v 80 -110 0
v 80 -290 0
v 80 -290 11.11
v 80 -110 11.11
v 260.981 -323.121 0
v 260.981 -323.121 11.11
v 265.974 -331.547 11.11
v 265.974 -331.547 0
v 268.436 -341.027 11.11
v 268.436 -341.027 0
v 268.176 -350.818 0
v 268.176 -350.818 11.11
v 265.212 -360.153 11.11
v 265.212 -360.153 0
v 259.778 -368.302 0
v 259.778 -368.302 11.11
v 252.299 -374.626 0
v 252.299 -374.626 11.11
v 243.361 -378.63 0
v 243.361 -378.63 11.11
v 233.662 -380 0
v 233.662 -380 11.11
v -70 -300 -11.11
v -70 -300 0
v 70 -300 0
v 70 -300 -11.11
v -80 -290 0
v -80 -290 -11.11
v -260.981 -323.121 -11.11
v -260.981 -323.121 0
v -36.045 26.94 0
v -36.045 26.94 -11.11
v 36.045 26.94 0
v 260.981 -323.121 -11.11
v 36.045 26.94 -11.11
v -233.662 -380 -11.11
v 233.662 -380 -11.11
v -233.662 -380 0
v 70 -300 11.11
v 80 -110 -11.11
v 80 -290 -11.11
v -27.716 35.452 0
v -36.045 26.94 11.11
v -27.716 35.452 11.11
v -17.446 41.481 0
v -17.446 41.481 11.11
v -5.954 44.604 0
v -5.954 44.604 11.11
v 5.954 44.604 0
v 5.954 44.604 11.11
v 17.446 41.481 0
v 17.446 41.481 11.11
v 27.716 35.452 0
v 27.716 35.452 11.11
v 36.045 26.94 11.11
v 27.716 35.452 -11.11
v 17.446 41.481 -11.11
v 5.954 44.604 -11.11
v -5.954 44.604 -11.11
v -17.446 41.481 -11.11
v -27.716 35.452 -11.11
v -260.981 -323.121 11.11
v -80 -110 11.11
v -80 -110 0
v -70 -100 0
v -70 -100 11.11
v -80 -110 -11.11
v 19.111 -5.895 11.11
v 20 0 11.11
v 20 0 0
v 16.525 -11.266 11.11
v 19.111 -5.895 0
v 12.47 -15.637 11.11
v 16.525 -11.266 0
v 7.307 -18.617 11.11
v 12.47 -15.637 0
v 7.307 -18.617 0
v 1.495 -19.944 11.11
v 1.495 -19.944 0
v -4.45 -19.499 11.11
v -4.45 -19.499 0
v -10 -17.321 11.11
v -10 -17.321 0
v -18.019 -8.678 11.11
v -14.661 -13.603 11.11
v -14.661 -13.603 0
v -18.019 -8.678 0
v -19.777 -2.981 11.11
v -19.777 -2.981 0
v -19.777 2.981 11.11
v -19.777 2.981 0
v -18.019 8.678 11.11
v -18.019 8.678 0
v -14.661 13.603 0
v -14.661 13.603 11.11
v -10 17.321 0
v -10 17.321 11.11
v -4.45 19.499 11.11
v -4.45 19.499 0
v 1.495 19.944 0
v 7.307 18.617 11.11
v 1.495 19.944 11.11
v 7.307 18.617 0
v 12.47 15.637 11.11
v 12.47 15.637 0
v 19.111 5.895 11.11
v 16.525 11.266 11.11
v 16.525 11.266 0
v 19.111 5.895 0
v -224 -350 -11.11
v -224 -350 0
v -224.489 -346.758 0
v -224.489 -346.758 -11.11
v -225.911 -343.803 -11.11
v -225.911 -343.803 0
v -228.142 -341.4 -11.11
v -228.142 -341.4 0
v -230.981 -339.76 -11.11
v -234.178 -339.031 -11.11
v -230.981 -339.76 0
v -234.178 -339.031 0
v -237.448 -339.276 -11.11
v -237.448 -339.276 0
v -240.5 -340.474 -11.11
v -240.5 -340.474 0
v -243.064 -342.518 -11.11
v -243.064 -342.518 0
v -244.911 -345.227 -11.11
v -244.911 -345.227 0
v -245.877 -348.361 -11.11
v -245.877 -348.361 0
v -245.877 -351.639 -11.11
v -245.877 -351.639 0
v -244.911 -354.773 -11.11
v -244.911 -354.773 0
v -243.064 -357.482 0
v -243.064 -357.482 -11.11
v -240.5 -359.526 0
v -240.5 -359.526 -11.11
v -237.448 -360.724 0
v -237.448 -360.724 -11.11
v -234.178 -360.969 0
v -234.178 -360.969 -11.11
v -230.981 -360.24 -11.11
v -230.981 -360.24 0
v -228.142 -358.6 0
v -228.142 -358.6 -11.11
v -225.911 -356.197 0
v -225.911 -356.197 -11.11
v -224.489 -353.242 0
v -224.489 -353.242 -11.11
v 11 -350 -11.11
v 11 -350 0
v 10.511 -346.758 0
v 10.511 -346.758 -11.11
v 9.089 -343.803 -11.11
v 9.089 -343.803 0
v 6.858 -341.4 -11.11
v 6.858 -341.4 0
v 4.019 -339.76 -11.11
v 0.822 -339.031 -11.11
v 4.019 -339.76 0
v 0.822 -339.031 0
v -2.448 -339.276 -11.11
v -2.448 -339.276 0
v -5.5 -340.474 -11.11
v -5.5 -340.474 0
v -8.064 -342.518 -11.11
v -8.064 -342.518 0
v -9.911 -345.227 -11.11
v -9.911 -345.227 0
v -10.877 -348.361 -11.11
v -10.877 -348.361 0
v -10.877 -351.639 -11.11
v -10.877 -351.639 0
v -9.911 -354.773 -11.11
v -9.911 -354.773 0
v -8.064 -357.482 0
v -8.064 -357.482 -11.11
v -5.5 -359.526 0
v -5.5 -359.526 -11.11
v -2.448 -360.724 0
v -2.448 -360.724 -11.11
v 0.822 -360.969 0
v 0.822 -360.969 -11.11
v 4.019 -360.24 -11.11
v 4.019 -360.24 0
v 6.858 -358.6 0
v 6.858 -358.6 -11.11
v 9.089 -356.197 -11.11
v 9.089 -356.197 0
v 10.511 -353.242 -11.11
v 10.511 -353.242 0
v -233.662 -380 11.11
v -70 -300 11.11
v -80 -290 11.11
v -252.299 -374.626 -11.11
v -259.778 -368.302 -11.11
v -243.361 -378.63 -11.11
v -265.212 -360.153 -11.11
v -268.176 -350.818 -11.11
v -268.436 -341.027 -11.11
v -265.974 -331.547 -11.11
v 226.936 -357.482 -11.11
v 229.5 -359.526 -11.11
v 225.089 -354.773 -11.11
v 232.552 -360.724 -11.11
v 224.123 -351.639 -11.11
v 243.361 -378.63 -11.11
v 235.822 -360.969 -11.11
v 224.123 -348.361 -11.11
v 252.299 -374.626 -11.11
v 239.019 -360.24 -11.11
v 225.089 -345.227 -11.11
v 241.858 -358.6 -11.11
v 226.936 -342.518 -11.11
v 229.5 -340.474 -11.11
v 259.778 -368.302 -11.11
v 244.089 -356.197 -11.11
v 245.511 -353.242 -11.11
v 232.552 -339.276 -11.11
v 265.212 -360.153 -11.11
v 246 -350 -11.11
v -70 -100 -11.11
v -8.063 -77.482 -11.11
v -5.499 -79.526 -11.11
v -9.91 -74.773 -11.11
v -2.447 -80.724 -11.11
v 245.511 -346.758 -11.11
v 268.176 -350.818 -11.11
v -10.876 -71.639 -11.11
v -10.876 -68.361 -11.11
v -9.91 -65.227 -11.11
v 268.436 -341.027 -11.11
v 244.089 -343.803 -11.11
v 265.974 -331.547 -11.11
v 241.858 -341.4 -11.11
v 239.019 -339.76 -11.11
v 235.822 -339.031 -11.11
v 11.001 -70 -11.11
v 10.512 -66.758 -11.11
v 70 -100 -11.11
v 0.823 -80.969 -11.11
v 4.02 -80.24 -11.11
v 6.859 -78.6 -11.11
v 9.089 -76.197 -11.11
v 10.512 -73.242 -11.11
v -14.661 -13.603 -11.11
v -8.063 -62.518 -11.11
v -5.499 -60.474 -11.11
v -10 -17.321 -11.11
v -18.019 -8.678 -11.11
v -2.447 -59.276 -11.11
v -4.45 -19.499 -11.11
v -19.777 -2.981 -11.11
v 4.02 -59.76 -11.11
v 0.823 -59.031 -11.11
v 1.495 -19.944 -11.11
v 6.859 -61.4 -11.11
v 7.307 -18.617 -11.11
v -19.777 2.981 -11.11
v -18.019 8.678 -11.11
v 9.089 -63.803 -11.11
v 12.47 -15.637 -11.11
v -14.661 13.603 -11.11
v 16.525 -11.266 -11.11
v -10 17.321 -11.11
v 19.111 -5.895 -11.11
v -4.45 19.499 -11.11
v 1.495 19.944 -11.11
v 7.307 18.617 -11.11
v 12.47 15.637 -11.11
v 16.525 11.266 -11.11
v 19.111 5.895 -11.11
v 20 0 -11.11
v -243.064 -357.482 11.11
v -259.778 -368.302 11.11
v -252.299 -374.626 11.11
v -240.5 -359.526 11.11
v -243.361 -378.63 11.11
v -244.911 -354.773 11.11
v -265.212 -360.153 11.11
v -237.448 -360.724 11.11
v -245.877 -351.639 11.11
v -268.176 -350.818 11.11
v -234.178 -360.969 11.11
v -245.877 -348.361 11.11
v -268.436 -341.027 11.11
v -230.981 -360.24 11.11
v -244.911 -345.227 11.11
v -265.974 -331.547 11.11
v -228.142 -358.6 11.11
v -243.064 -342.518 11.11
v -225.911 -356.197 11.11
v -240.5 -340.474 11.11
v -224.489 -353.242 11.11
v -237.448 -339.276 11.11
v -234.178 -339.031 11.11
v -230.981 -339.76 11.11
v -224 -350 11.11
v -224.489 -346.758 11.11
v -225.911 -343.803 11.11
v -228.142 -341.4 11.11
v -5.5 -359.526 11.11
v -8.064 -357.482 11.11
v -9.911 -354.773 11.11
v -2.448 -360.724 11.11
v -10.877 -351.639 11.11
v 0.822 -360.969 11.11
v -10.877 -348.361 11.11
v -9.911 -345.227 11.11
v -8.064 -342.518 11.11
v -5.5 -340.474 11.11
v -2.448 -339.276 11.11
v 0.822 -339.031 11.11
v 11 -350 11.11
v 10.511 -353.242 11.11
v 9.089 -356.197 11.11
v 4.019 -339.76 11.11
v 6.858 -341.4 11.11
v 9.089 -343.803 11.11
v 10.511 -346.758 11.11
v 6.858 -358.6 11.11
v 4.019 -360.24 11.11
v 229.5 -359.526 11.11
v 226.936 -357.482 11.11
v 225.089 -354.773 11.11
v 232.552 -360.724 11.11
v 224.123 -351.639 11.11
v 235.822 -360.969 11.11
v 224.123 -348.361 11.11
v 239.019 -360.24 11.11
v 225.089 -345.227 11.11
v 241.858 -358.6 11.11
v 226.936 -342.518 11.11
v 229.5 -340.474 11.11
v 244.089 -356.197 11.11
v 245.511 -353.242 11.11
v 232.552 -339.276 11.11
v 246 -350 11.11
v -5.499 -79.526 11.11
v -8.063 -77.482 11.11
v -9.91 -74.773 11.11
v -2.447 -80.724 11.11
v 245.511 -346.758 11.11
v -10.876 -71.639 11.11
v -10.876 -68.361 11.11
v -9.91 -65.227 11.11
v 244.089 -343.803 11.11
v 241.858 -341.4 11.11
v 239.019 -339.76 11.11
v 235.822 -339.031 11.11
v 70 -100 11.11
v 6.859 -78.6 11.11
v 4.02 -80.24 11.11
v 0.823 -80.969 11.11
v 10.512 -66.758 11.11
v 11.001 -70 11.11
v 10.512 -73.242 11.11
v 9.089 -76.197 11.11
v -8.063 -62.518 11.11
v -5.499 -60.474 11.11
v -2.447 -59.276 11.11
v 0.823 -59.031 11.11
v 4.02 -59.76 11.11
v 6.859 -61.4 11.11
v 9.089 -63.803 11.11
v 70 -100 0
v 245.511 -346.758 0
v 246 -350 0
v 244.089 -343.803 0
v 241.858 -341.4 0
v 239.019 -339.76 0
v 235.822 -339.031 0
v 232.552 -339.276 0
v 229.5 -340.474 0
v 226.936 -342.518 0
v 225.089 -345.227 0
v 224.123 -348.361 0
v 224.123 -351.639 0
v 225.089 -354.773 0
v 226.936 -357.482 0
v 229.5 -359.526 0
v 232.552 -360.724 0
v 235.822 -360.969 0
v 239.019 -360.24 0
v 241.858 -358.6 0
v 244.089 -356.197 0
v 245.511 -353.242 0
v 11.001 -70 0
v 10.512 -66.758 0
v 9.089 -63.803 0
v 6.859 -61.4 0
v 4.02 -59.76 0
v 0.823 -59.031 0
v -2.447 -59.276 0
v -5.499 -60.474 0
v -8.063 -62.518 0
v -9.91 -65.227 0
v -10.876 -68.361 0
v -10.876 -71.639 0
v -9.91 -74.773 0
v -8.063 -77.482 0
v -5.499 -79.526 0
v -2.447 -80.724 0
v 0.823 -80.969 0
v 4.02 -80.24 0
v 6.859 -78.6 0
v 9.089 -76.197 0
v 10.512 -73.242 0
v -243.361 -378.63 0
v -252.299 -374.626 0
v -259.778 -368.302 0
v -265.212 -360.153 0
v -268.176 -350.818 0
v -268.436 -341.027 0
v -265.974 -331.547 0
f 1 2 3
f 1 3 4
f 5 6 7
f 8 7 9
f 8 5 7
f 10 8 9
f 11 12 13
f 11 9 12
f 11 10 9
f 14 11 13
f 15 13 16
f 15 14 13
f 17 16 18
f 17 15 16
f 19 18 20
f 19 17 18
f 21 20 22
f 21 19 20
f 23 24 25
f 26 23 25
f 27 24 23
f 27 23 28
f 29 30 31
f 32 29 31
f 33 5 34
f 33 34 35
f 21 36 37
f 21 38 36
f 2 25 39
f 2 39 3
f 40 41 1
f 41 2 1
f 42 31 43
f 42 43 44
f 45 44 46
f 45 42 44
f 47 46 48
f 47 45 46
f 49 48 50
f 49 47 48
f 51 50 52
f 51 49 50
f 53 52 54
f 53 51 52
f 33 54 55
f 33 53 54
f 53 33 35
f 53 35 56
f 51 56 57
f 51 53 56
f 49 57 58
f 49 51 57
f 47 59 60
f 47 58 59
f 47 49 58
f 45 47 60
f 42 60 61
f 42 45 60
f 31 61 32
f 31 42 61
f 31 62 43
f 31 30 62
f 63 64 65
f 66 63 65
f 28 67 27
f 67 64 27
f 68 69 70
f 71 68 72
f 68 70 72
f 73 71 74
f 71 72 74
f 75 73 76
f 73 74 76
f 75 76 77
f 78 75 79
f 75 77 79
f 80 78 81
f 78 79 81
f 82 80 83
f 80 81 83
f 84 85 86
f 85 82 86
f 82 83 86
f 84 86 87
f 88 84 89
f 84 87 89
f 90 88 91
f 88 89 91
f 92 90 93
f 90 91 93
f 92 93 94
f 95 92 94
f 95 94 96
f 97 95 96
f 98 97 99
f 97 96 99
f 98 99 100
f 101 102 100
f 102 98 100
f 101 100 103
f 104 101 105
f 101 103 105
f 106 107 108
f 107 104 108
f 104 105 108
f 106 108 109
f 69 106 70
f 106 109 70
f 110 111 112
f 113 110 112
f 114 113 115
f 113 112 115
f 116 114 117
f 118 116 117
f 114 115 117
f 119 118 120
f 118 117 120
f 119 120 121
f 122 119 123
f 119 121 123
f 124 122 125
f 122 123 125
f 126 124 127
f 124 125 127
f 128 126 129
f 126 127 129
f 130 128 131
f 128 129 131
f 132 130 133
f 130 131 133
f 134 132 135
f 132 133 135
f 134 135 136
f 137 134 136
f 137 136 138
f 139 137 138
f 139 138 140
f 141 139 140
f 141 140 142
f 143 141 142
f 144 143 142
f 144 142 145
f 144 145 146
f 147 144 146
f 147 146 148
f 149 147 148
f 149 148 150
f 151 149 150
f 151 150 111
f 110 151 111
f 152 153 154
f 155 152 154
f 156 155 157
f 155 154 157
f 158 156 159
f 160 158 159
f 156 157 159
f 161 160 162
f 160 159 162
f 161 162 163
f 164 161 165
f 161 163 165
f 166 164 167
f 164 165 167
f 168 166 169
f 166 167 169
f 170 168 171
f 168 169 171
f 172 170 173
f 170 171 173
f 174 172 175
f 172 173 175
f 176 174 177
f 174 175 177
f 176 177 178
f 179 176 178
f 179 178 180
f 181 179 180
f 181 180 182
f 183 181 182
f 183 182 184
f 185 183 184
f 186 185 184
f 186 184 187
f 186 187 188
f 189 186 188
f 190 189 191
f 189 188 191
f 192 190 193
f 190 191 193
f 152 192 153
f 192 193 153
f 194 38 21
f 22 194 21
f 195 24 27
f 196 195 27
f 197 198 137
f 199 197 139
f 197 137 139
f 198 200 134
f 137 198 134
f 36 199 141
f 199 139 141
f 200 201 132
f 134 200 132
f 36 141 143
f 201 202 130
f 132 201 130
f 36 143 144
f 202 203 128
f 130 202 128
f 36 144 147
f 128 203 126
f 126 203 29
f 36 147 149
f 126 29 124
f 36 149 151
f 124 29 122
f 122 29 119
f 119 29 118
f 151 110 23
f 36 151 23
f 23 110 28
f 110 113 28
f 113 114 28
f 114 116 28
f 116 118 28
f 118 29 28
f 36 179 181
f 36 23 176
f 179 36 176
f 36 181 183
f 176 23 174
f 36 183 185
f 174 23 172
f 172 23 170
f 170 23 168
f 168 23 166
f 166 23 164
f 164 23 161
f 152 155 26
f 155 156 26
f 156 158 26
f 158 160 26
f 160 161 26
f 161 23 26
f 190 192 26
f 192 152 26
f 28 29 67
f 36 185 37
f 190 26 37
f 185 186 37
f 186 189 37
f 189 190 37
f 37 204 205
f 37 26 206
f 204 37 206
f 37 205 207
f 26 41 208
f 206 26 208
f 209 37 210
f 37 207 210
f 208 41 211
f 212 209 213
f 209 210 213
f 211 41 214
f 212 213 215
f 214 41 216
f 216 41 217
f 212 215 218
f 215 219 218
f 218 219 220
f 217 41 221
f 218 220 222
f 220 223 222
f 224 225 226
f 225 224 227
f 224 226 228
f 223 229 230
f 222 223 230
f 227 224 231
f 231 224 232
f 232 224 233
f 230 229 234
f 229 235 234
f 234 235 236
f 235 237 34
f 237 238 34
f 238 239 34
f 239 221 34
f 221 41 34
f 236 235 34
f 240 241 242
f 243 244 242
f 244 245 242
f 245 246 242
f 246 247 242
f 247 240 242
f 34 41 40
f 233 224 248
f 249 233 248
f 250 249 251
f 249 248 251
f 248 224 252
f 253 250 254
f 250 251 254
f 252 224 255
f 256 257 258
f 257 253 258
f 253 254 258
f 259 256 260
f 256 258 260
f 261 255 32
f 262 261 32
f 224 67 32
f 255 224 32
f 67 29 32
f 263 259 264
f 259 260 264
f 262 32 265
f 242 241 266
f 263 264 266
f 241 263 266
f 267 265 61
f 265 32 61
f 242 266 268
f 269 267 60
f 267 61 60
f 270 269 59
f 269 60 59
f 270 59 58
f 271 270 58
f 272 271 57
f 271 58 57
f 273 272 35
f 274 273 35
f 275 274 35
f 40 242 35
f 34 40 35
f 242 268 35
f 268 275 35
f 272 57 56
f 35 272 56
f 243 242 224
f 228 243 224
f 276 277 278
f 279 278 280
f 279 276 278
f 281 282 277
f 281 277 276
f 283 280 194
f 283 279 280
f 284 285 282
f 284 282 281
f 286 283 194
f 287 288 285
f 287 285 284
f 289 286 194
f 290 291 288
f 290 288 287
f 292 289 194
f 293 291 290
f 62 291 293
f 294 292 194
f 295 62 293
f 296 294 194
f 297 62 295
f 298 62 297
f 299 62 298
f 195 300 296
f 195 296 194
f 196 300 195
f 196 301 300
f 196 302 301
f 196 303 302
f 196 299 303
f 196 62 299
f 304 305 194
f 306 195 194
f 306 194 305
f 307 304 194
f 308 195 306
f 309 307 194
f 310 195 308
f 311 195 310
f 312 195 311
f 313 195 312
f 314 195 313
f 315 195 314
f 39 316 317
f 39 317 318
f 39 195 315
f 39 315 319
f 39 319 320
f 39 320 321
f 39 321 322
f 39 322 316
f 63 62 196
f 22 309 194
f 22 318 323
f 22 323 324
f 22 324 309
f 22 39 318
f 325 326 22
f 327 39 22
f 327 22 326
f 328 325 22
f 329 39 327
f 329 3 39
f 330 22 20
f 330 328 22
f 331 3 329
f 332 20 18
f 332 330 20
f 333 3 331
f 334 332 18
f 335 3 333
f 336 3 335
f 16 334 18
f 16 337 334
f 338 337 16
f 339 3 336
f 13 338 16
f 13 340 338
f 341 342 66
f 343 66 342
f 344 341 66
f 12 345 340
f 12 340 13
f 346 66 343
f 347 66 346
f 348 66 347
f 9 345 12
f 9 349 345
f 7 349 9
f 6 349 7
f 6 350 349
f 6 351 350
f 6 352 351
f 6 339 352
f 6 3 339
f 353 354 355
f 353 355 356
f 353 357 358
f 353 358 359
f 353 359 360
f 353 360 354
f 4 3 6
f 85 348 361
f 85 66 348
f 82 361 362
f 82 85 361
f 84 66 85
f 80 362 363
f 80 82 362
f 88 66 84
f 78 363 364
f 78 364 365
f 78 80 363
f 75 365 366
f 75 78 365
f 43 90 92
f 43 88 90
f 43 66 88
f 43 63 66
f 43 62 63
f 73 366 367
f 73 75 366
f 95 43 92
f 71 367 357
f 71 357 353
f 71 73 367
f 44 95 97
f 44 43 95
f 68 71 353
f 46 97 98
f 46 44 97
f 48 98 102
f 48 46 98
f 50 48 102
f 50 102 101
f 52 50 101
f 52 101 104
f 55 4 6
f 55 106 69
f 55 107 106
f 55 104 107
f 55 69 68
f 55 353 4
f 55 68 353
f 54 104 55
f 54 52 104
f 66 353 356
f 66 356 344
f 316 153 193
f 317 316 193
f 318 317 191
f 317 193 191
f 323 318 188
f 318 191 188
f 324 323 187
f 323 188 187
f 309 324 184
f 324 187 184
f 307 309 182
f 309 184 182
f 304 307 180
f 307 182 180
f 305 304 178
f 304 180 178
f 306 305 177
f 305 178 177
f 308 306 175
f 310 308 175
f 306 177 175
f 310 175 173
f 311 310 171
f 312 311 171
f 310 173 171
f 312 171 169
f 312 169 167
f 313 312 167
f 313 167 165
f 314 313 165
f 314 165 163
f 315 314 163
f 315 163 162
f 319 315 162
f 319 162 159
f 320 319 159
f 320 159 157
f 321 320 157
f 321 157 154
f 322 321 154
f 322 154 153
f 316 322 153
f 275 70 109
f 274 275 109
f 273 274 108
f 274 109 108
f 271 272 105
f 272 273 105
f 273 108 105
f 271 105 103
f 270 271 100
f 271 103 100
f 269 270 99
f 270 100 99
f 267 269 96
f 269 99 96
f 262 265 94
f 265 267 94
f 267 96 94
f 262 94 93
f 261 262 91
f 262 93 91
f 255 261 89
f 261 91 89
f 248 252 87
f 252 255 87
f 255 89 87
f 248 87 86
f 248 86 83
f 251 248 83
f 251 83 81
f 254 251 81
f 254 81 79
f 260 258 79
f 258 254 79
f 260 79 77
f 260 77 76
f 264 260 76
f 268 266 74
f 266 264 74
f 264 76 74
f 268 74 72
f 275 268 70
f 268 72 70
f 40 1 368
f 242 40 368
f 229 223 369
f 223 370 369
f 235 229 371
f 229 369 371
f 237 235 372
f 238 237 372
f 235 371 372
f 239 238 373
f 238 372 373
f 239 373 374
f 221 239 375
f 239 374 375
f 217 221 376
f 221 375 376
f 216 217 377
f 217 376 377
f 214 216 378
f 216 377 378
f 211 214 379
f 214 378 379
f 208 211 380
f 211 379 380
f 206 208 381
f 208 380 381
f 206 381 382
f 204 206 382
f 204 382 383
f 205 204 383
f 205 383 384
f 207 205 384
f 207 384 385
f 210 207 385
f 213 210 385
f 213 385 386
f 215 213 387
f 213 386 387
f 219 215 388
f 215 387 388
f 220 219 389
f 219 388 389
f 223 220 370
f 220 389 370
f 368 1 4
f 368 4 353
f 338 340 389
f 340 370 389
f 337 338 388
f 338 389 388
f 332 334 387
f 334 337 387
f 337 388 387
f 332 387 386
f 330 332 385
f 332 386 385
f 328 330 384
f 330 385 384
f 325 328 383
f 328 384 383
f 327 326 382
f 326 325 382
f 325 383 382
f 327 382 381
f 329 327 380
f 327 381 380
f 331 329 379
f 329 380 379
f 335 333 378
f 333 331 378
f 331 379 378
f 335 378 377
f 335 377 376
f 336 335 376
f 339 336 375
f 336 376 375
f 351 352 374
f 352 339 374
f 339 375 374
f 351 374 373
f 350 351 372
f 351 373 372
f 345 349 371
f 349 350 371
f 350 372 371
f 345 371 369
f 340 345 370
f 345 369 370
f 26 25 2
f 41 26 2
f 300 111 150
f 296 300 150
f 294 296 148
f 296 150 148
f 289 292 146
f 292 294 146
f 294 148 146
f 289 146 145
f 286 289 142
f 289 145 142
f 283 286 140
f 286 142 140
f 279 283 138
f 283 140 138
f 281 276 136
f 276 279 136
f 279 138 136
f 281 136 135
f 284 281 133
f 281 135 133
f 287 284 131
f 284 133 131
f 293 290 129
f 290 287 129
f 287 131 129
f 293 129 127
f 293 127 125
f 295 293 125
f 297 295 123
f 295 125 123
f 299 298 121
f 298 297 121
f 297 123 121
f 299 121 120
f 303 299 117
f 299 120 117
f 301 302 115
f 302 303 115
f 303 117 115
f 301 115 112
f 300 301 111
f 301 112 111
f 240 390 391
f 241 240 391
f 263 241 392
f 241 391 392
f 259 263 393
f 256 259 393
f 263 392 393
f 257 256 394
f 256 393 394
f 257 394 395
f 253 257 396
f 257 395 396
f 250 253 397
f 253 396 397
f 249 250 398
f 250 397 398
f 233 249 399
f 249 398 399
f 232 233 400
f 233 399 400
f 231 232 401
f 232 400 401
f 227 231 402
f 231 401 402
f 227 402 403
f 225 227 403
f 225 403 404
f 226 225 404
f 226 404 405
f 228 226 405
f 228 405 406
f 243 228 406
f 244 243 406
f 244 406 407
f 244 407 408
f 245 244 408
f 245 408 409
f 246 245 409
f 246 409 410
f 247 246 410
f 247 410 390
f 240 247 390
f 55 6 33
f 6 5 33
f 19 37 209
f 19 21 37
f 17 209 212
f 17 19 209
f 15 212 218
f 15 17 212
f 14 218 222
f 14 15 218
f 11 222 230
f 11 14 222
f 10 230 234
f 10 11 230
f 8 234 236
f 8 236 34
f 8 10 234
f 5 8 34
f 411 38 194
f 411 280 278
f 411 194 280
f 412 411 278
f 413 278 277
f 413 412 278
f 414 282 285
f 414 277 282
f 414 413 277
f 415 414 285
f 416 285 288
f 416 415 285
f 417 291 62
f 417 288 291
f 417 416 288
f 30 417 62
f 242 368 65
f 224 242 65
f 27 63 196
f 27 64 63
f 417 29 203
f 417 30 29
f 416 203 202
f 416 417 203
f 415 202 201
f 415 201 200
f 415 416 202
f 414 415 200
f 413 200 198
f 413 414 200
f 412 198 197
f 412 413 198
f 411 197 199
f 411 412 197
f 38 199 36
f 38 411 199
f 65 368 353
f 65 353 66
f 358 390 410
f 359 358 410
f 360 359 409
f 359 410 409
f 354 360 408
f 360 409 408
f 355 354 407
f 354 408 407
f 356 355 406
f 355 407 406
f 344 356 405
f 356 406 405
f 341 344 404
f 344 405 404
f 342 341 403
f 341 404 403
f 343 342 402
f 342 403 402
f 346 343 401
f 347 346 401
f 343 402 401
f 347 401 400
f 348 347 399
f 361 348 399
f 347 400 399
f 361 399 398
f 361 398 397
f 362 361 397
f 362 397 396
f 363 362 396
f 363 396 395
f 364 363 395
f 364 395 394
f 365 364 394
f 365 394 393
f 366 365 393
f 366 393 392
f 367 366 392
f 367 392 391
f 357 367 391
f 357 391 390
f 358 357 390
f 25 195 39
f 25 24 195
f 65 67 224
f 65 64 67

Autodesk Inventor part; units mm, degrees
ref_plane "YZ Plane" through (0, 0, 0) normal (1, 0, 0) x (0, 1, 0)
ref_plane "XZ Plane" through (0, 0, 0) normal (0, 1, 0) x (-1, 0, 0)
ref_plane "XY Plane" through (0, 0, 0) normal (0, 0, 1) x (1, 0, 0)
sketch "Sketch1" plane through (0, 0, 0) normal (0, 0, 1) x (1, 0, 0)
  circle A0 centre (0, 0) radius 20
  circle A1 centre (0, -350) radius 11
  circle A2 centre (-235, -350) radius 11
  circle A3 centre (235, -350) radius 11
  line L0 (-233.6625, -380) -> (233.6625, -380)
  arc A4 (233.6625, -380) -> (260.9808, -323.1206) centre (233.6625, -345) ccw
  circle A5 centre (0.0008, -70) radius 11
  line L1 (70, -100) -> (-70, -100)
  line L2 (-80, -110) -> (-80, -290)
  line L3 (-70, -300) -> (70, -300)
  line L4 (80, -290) -> (80, -110)
  line L5 (80, -100) -> (-80, -300) construction
  line L6 (-80, -100) -> (80, -300) construction
  line L7 (0, 64.9697) -> (0, -492.5476)
  arc A6 (-260.9808, -323.1206) -> (-233.6625, -380) centre (-233.6625, -345) ccw
  line L8 (-80, -110) -> (-70, -100)
  line L9 (80, -110) -> (70, -100)
  line L10 (70, -300) -> (80, -290)
  line L11 (-70, -300) -> (-80, -290)
  line L12 (-260.9808, -323.1206) -> (-36.0446, 26.9405)
  arc A7 (36.0446, 26.9405) -> (-36.0446, 26.9405) centre (0, 0) ccw
  line L13 (260.9808, -323.1206) -> (36.0446, 26.9405)
  point P0 (0, -200)
  point P1 (0, -200)
  dimension "d0" = 40
  dimension "d2" = 22
  dimension "d3" = 22
  dimension "d4" = 22
  dimension "d7" = 235
  dimension "d8" = 235
  dimension "d9" = 35
  dimension "d11" = 30
  dimension "d33" = 22
  dimension "d34" = 350
  dimension "d35" = 160
  dimension "d36" = 200
  dimension "d37" = 70
  dimension "d38" = 30
  dimension "d39" = 10
  dimension "d40" = 10
  dimension "d41" = 10
  dimension "d42" = 10
  dimension "d43" = 10
  dimension "d44" = 10
  dimension "d45" = 10
  dimension "d46" = 10
  dimension "d47" = 45
extrude "Extrusion2" add sketch "Sketch1" along normal mid plane 22.22 contours A0 L7 A7 L13 A4 L0 A1 L3 L10 L4 L9 L1 A5 | A0 L7 A5 L1 L8 L2 L11 L3 A1 L0 A6 L12 A7
equation "\"d8\" = d7"
equation "\"d40\" = d39"
equation "\"d42\" = d41"
equation "\"d43\" = d41"
equation "\"d44\" = d43"
equation "\"d45\" = d41"
equation "\"d46\" = d45"
properties part number "Corpo_Suporte_4_Cabos_Modelo1"
